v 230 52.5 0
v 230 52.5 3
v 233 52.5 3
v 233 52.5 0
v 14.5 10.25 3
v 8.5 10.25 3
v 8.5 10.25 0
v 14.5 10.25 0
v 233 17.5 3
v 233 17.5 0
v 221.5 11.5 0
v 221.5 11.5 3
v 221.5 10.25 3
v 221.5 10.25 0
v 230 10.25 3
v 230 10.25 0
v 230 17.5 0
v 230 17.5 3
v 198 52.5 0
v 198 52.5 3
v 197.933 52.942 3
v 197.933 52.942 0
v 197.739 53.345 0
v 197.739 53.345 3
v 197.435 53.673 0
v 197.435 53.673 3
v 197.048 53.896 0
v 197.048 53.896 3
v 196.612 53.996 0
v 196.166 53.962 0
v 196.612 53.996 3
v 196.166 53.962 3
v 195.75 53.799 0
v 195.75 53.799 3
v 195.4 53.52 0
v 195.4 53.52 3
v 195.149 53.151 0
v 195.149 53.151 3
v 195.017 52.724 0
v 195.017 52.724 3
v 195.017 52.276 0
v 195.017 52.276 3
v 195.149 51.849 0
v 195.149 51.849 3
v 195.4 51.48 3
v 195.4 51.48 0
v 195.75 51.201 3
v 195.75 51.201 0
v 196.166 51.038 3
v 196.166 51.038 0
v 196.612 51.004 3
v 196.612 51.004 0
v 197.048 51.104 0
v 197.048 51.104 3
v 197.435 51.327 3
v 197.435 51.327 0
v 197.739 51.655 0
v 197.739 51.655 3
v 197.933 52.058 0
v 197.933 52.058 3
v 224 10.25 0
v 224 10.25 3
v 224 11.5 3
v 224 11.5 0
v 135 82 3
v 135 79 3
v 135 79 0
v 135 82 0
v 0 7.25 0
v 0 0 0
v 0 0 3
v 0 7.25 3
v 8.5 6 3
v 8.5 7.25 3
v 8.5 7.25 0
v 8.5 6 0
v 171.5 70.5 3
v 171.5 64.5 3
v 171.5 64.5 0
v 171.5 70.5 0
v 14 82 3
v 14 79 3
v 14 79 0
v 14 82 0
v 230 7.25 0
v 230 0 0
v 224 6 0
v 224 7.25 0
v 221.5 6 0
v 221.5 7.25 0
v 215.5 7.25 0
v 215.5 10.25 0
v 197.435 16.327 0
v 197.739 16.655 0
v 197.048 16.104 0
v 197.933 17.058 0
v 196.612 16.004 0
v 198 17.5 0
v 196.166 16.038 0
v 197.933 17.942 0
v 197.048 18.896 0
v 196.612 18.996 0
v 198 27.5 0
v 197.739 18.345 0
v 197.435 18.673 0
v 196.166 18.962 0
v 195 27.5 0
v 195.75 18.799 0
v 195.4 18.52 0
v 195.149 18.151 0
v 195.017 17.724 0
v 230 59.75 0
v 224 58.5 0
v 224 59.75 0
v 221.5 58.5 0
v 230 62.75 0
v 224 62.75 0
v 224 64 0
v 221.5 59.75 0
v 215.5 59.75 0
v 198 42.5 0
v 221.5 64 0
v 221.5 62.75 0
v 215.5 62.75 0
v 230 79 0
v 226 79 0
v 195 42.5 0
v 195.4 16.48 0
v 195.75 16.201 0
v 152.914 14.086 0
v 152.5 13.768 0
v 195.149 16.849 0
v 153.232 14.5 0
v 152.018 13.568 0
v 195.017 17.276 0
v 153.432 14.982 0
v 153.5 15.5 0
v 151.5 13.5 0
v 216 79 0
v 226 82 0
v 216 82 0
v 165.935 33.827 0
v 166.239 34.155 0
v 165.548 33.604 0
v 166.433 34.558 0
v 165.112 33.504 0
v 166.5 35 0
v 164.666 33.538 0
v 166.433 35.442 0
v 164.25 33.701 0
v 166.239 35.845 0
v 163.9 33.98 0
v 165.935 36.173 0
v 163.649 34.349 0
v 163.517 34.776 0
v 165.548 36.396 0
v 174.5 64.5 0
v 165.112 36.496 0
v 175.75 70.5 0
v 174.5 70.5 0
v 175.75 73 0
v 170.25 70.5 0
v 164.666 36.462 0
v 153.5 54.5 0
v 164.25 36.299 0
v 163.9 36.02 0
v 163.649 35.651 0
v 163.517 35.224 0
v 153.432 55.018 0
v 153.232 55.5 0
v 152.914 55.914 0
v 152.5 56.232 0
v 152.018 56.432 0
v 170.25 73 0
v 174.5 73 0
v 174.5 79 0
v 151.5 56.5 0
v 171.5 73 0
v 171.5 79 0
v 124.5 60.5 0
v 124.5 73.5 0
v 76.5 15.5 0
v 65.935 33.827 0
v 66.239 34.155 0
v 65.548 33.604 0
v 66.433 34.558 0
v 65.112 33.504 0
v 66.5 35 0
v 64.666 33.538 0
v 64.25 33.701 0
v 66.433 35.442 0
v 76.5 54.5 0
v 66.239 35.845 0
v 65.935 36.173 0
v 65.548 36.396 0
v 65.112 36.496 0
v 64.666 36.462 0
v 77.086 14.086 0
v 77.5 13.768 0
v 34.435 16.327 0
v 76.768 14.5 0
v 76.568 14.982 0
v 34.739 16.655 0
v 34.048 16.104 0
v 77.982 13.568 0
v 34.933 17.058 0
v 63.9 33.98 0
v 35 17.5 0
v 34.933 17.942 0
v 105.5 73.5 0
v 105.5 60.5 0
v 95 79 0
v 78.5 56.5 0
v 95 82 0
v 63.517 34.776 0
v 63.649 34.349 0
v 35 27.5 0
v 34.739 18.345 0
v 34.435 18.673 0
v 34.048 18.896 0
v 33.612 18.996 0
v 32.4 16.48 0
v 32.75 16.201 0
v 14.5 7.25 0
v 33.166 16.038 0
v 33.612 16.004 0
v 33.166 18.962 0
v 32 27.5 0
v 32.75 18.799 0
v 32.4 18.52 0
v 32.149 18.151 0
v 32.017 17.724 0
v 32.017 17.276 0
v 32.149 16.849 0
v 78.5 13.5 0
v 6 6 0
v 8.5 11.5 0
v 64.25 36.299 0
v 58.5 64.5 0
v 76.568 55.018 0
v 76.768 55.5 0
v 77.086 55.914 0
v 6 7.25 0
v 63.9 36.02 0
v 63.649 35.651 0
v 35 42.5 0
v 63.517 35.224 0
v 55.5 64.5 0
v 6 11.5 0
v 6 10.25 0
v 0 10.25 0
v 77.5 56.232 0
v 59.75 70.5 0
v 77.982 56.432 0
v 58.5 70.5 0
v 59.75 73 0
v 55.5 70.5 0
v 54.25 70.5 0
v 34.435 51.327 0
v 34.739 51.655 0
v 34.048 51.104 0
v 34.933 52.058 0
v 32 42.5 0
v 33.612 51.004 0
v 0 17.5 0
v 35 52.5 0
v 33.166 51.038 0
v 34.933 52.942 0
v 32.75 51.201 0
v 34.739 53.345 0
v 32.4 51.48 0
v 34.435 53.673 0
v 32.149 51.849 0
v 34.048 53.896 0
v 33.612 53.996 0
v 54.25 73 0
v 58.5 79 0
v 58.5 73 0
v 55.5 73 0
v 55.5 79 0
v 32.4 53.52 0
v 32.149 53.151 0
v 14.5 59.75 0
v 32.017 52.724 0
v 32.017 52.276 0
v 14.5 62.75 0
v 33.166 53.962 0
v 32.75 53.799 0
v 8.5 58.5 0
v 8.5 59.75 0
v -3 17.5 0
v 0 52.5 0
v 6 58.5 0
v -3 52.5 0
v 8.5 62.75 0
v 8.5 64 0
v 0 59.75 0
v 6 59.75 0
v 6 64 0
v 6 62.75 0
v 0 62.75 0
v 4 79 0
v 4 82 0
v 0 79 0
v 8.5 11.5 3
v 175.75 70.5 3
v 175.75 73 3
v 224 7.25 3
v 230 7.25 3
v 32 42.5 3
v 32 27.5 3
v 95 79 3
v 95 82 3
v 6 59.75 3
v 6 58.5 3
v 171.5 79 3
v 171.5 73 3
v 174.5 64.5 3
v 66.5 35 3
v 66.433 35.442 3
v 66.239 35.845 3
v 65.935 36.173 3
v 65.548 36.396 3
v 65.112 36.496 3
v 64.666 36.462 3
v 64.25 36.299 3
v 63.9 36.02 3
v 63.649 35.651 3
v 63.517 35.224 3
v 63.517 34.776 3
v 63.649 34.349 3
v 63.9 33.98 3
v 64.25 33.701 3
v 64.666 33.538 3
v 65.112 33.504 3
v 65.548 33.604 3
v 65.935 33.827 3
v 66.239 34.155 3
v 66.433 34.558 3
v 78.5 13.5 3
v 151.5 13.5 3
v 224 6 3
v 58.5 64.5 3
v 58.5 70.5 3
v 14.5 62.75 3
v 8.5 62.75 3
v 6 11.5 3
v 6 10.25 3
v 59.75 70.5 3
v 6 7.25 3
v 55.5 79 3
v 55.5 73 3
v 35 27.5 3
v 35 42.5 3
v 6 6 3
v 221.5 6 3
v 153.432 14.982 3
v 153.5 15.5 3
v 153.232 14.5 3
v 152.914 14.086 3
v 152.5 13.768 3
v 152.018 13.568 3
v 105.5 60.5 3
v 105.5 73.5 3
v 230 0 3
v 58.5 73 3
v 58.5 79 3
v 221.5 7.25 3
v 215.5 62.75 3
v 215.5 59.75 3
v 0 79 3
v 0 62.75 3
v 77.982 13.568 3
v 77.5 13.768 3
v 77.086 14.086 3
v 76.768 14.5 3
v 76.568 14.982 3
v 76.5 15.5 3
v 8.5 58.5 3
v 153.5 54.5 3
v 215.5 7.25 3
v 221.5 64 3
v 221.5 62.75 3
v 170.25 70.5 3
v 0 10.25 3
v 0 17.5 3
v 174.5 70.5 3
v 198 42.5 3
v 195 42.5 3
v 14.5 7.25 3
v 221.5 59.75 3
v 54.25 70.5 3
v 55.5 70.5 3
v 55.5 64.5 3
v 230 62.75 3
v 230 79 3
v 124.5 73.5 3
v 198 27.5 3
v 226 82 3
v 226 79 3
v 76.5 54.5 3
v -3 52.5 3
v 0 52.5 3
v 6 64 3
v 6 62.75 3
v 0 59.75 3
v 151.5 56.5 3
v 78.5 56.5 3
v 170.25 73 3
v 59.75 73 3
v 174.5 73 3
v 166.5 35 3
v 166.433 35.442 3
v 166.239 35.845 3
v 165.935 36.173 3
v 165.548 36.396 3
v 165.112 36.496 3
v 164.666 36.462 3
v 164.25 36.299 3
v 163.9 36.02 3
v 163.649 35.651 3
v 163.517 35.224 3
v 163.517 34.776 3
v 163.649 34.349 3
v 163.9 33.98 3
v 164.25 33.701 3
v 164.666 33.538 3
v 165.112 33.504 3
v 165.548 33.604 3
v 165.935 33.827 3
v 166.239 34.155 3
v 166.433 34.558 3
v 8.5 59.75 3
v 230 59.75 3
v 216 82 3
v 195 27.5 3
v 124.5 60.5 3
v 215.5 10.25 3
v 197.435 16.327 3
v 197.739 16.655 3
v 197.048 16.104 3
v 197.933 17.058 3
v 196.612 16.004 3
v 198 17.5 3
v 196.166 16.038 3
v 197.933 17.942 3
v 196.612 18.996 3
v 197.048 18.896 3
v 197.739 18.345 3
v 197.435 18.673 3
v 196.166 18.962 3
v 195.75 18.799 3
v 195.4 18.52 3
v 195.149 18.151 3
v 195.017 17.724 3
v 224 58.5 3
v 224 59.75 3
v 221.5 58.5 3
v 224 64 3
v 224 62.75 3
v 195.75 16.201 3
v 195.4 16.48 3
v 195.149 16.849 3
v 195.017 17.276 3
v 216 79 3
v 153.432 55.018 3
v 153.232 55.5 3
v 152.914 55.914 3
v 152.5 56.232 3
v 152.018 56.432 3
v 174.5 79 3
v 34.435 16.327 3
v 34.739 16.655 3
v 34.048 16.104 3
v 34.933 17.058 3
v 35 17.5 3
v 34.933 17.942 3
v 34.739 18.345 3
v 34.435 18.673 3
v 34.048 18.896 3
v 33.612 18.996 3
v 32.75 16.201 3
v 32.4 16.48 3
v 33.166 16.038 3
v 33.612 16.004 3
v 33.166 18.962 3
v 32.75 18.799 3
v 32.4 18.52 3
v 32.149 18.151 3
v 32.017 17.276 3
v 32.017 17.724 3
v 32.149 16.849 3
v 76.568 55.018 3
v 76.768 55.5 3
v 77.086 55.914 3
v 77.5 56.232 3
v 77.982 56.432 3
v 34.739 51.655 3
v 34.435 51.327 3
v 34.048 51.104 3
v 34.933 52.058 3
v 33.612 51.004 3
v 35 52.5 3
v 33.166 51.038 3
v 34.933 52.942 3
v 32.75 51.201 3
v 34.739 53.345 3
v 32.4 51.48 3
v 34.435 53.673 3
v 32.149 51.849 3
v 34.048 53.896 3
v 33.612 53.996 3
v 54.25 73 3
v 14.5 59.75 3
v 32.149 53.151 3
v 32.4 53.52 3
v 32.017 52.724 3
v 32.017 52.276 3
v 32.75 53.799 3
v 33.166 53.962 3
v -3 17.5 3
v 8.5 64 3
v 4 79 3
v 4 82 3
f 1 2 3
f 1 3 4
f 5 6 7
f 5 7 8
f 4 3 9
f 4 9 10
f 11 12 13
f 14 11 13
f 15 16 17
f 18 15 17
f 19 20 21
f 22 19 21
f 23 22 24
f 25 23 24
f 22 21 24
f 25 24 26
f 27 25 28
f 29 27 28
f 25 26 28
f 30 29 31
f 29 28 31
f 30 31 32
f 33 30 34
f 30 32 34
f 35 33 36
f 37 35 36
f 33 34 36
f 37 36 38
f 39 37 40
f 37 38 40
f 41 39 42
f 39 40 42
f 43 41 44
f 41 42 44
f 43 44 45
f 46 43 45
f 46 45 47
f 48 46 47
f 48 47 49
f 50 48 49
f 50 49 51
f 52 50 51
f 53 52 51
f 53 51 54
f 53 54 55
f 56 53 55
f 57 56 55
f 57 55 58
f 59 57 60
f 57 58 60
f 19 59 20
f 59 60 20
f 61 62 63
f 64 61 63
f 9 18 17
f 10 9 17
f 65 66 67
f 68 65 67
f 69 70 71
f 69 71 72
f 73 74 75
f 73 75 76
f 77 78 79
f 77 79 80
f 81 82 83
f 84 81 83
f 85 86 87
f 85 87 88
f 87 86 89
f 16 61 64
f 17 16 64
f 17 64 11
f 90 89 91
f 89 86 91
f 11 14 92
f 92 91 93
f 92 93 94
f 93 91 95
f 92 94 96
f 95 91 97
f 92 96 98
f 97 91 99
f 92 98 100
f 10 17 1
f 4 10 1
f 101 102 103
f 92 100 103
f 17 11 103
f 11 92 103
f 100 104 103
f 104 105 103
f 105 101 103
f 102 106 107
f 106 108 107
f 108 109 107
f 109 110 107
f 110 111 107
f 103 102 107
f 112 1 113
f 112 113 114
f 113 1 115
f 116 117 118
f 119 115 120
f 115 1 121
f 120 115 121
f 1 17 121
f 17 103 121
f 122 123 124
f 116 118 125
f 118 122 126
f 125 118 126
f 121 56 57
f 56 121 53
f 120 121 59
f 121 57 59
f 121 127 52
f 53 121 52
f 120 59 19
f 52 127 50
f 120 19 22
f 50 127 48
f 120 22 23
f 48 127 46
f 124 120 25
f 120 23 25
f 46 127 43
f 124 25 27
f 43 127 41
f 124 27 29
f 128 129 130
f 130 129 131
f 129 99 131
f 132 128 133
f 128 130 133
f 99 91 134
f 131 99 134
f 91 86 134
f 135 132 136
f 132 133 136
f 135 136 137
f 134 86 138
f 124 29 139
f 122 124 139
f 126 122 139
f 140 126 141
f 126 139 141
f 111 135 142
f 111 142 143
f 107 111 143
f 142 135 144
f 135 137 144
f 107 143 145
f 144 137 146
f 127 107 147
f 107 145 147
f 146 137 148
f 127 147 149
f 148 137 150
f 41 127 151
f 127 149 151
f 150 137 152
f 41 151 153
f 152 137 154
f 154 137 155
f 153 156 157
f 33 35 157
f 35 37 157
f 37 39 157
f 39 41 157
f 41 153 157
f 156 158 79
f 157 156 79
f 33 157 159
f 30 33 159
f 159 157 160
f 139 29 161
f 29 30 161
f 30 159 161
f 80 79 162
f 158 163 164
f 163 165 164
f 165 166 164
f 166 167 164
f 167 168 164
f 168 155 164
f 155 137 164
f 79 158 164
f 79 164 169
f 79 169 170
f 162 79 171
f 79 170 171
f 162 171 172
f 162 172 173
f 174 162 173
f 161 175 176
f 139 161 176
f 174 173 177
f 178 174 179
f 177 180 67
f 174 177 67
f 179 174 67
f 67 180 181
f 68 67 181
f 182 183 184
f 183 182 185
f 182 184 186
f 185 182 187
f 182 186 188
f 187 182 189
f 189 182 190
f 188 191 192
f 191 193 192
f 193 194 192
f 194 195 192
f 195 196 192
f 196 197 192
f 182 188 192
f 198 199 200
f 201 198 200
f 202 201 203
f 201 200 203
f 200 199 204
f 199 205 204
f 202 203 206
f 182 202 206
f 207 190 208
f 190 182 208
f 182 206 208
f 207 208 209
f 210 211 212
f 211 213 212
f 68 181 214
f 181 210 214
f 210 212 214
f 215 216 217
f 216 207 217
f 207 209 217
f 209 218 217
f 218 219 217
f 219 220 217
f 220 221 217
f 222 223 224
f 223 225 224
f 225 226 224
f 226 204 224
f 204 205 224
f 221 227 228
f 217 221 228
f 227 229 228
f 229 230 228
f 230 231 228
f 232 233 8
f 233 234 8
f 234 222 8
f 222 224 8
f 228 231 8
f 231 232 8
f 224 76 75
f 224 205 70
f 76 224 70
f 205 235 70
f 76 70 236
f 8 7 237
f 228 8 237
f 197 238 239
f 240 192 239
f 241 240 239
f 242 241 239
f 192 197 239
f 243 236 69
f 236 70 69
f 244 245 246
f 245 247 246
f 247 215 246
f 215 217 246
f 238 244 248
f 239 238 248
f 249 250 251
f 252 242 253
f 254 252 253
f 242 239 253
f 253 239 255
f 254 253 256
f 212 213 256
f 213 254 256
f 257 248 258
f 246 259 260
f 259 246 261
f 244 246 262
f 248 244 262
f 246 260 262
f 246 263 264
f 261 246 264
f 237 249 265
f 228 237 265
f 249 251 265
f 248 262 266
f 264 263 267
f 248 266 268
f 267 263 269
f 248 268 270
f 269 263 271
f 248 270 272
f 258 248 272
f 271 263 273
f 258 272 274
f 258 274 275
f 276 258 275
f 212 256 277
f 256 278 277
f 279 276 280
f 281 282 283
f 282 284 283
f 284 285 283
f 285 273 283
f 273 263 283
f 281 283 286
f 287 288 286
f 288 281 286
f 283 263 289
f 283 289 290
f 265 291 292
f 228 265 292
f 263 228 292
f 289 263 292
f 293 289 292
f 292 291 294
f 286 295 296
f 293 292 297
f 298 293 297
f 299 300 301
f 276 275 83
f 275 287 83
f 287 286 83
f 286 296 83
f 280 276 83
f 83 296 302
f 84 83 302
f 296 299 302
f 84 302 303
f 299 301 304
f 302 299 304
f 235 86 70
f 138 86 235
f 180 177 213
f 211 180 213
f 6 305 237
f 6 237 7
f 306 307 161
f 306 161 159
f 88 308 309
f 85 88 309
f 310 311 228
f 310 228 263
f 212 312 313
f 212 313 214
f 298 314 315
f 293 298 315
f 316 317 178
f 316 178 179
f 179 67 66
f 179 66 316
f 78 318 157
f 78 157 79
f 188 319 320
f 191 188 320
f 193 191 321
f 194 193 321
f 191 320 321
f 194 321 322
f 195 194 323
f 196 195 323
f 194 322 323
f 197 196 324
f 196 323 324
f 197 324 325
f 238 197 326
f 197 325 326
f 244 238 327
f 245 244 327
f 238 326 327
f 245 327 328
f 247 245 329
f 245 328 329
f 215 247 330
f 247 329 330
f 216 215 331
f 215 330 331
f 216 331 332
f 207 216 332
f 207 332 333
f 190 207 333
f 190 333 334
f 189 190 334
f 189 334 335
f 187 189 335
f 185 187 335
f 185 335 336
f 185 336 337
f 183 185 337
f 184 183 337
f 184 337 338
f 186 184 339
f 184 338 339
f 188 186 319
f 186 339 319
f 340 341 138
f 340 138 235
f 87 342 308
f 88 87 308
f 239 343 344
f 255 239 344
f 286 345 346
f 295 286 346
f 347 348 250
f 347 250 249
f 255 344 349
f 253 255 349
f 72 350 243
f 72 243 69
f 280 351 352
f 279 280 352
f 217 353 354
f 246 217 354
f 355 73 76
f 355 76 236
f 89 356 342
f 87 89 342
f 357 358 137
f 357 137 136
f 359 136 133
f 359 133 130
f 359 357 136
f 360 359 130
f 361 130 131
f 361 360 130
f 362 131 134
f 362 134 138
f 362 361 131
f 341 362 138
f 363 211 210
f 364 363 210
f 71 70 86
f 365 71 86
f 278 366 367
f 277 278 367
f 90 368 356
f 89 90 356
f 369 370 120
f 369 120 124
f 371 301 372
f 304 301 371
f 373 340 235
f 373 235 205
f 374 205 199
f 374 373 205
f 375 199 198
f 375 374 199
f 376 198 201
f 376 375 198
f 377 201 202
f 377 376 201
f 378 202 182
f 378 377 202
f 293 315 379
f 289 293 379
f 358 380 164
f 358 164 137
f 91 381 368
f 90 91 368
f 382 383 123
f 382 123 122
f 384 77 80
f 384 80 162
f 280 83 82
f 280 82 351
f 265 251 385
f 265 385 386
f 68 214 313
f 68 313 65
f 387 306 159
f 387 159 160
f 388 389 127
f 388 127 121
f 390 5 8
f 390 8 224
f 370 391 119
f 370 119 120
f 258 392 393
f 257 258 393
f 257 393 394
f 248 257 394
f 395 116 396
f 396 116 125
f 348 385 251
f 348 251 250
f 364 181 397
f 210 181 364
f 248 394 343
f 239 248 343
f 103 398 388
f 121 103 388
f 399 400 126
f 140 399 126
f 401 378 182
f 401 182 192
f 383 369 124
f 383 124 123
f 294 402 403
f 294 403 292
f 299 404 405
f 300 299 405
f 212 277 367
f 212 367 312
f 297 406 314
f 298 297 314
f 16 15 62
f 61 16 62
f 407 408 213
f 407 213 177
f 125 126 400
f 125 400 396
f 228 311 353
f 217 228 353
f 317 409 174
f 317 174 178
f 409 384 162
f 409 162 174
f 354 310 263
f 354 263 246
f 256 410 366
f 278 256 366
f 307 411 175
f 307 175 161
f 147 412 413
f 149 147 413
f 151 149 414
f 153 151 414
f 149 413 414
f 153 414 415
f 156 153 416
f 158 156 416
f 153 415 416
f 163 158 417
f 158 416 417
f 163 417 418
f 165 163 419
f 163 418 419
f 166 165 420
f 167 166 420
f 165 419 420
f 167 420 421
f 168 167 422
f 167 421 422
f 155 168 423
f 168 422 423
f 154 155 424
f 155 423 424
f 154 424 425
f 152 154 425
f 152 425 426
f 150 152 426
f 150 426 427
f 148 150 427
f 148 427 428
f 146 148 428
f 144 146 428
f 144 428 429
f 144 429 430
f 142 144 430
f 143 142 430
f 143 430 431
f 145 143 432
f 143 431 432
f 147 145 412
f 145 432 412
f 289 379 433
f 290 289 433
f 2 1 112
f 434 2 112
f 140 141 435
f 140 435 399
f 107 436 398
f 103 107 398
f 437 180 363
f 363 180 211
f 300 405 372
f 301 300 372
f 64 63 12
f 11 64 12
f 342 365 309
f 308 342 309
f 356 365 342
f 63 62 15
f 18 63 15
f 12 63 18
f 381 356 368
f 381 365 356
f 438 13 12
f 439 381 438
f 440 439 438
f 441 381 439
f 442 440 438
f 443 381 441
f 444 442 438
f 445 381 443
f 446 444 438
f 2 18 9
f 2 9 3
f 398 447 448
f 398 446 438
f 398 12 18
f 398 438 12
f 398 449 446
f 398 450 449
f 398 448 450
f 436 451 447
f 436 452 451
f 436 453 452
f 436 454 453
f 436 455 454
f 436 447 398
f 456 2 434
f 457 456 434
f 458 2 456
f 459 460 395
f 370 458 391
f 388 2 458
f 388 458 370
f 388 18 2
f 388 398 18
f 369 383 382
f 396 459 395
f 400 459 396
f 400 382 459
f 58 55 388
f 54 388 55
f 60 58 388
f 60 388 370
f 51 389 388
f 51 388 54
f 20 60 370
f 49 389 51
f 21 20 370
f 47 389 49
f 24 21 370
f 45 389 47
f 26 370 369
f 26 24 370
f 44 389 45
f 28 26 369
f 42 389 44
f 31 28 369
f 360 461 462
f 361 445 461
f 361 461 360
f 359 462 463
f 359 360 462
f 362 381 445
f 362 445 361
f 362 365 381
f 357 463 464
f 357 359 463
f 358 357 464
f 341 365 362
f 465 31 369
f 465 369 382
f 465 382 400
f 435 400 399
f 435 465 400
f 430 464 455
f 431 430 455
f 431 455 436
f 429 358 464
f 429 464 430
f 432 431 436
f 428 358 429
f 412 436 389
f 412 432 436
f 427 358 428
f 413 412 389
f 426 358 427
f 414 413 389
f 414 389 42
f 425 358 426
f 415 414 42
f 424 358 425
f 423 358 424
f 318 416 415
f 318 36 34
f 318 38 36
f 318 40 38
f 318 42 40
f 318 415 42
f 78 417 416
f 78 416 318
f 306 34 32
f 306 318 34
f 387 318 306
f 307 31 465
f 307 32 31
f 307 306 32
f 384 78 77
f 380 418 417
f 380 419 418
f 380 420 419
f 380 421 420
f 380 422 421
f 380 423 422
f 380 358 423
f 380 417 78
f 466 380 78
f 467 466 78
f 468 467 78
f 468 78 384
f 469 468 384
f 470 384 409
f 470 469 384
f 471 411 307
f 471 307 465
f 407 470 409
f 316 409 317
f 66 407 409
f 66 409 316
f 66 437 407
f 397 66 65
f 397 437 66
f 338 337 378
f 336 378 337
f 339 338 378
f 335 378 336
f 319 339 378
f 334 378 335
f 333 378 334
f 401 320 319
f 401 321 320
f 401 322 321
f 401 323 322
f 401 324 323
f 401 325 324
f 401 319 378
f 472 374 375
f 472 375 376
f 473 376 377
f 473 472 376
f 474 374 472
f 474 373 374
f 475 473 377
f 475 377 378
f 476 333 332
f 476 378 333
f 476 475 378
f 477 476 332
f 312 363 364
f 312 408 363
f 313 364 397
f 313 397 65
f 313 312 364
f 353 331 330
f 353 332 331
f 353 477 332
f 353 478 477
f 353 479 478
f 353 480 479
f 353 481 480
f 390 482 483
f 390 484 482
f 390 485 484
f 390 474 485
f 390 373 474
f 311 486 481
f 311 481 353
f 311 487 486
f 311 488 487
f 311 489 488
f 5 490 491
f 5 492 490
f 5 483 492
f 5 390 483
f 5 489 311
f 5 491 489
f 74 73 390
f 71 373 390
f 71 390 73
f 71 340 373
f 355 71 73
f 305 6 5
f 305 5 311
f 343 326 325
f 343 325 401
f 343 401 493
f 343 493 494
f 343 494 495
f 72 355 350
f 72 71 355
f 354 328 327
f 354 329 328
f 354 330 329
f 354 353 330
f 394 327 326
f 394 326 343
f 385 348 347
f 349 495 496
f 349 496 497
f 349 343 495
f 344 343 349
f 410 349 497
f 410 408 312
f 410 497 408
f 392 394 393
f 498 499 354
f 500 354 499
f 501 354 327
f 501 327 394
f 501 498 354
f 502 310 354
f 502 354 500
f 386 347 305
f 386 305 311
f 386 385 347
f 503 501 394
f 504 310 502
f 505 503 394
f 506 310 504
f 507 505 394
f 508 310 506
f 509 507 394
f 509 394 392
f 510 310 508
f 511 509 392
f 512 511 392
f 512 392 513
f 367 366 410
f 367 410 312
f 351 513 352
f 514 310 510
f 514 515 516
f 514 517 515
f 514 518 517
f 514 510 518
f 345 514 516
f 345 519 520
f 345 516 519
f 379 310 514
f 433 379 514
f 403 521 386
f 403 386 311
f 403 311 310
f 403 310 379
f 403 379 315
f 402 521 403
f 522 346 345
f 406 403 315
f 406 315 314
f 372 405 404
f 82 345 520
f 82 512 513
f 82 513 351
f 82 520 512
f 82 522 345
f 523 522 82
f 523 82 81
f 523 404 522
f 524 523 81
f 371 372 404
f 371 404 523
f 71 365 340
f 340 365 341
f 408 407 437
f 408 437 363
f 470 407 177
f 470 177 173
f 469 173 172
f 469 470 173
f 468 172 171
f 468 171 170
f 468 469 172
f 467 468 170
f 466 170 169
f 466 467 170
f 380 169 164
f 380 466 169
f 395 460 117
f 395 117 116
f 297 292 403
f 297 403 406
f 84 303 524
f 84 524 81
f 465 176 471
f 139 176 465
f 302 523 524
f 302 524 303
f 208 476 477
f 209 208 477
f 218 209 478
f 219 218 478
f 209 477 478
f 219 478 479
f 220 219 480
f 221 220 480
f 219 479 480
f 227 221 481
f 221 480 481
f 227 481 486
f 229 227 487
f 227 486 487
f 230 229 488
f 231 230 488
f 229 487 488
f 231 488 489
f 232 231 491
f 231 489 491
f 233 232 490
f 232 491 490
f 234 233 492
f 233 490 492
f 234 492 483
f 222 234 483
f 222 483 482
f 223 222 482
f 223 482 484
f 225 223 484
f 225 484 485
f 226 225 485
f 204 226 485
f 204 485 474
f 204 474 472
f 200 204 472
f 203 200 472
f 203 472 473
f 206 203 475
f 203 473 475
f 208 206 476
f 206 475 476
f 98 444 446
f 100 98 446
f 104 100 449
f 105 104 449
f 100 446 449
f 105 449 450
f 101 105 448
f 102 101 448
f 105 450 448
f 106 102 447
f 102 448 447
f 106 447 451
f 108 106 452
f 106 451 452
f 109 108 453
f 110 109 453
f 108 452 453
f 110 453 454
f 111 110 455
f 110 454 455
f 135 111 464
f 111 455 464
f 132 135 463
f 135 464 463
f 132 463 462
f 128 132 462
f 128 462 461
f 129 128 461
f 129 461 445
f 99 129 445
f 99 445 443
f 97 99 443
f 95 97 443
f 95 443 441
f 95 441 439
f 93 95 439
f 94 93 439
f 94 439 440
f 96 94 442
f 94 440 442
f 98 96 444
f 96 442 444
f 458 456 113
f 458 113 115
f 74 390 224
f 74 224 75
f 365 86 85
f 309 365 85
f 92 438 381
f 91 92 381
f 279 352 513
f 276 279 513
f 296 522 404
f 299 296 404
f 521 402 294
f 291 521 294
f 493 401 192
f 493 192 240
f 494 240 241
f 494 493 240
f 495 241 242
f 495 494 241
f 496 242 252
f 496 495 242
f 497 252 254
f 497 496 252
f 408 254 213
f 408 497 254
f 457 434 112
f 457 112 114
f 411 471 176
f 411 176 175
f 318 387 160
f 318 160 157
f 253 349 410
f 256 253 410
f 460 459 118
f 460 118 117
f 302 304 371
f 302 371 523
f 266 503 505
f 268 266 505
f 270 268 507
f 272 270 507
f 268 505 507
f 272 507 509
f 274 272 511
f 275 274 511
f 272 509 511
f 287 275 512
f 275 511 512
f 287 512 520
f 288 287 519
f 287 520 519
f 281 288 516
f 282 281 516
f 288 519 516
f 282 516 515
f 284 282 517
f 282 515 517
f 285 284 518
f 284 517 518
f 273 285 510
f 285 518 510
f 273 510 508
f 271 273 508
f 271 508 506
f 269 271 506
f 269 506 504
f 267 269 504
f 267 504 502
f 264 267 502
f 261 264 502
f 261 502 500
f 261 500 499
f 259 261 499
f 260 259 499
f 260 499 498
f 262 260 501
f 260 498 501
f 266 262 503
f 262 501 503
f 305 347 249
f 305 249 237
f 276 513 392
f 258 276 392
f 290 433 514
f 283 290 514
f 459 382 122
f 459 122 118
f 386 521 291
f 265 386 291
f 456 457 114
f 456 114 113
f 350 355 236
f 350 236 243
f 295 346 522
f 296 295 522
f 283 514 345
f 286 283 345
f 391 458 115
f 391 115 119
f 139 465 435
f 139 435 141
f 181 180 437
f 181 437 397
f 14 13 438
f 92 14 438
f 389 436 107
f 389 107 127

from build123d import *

# Parameters (mm, degrees)
SKETCH_1_W           = 230
SKETCH_1_H           = 79
EXTRUDE_1_DEPTH      = 3
EXTRUDE_2_DEPTH      = 3
EXTRUDE_2_DEPTH_BACK = 233
SKETCH_4_W           = 3
SKETCH_4_H           = 35
SKETCH_2_R           = 1.5
CUT_EXTRUDE_1_DEPTH  = 3
SKETCH_3_R           = 1.5
CUT_EXTRUDE_2_DEPTH  = 3
SKETCH_5_W           = 3
SKETCH_5_H           = 15
CUT_EXTRUDE_3_DEPTH  = 3
CUT_EXTRUDE_4_DEPTH  = 3
SKETCH_8_W           = 10
SKETCH_8_H           = 3
EXTRUDE_3_DEPTH      = 3
SKETCH_9_W           = 40
SKETCH_9_H           = 3
EXTRUDE_4_DEPTH      = 3
CUT_EXTRUDE_5_DEPTH  = 3
CUT_EXTRUDE_6_DEPTH  = 3
SKETCH_12_W          = 19
SKETCH_12_H          = 13
CUT_EXTRUDE_7_DEPTH  = 10


with BuildPart() as part:
    # Эскиз1 → Бобышка-Вытянуть1 (new body)
    with BuildSketch(Plane.XY):
        with Locations((115, 39.5)):
            Rectangle(SKETCH_1_W, SKETCH_1_H)
    extrude(amount=EXTRUDE_1_DEPTH)

    # Эскиз4 → Бобышка-Вытянуть2 (add, two sides: drawn at the far end of the back side and taken through both)
    with BuildSketch(Plane(origin=(230, 0, 0), x_dir=(0, 0, -1), z_dir=(1, 0, 0)).offset(-EXTRUDE_2_DEPTH_BACK)):
        with Locations((-1.5, 35)):
            Rectangle(SKETCH_4_W, SKETCH_4_H)
    extrude(amount=EXTRUDE_2_DEPTH + EXTRUDE_2_DEPTH_BACK)

    # Эскиз2 → Вырез-Вытянуть1 (cut)
    with BuildSketch(Plane.XY.offset(3)):
        with Locations((65, 35)):
            Circle(SKETCH_2_R)
        with Locations((165, 35)):
            Circle(SKETCH_2_R)
    extrude(amount=-CUT_EXTRUDE_1_DEPTH, mode=Mode.SUBTRACT)

    # Эскиз3 → Вырез-Вытянуть2 (cut)
    with BuildSketch(Plane.XY.offset(3)):
        with Locations((33.5, 52.5)):
            Circle(SKETCH_3_R)
        with Locations((196.5, 52.5)):
            Circle(SKETCH_3_R)
        with Locations((196.5, 17.5)):
            Circle(SKETCH_3_R)
        with Locations((33.5, 17.5)):
            Circle(SKETCH_3_R)
    extrude(amount=-CUT_EXTRUDE_2_DEPTH, mode=Mode.SUBTRACT)

    # Эскиз5 → Вырез-Вытянуть3 (cut)
    with BuildSketch(Plane.XY.offset(3)):
        with Locations((33.5, 35)):
            Rectangle(SKETCH_5_W, SKETCH_5_H)
        with Locations((196.5, 35)):
            Rectangle(SKETCH_5_W, SKETCH_5_H)
    extrude(amount=-CUT_EXTRUDE_3_DEPTH, mode=Mode.SUBTRACT)

    # Эскиз6 → Вырез-Вытянуть4 (cut)
    with BuildSketch(Plane.XY.offset(3)):
        Polygon((0, 10.25), (6, 10.25), (6, 11.5), (8.5, 11.5), (8.5, 10.25), (14.5, 10.25), (14.5, 7.25), (8.5, 7.25), (8.5, 6), (6, 6), (6, 7.25), (0, 7.25), align=None)
        Polygon((230, 7.25), (230, 10.25), (224, 10.25), (224, 11.5), (221.5, 11.5), (221.5, 10.25), (215.5, 10.25), (215.5, 7.25), (221.5, 7.25), (221.5, 6), (224, 6), (224, 7.25), align=None)
        Polygon((230, 59.75), (224, 59.75), (224, 58.5), (221.5, 58.5), (221.5, 59.75), (215.5, 59.75), (215.5, 62.75), (221.5, 62.75), (221.5, 64), (224, 64), (224, 62.75), (230, 62.75), align=None)
        Polygon((0, 62.75), (0, 59.75), (6, 59.75), (6, 58.5), (8.5, 58.5), (8.5, 59.75), (14.5, 59.75), (14.5, 62.75), (8.5, 62.75), (8.5, 64), (6, 64), (6, 62.75), align=None)
    extrude(amount=-CUT_EXTRUDE_4_DEPTH, mode=Mode.SUBTRACT)

    # Эскиз8 → Бобышка-Вытянуть3 (add)
    with BuildSketch(Plane(origin=(0, 79, 0), x_dir=(1, 0, 0), z_dir=(0, 1, 0))):
        with Locations((221, -1.5)):
            Rectangle(SKETCH_8_W, SKETCH_8_H)
        with Locations((9, -1.5)):
            Rectangle(SKETCH_8_W, SKETCH_8_H)
    extrude(amount=EXTRUDE_3_DEPTH)

    # Эскиз9 → Бобышка-Вытянуть4 (add)
    with BuildSketch(Plane(origin=(0, 79, 0), x_dir=(1, 0, 0), z_dir=(0, 1, 0))):
        with Locations((115, -1.5)):
            Rectangle(SKETCH_9_W, SKETCH_9_H)
    extrude(amount=EXTRUDE_4_DEPTH)

    # Эскиз10 → Вырез-Вытянуть5 (cut)
    with BuildSketch(Plane.XY.offset(3)):
        Polygon((55.5, 79), (55.5, 73), (54.25, 73), (54.25, 70.5), (55.5, 70.5), (55.5, 64.5), (58.5, 64.5), (58.5, 70.5), (59.75, 70.5), (59.75, 73), (58.5, 73), (58.5, 79), align=None)
        Polygon((171.5, 79), (174.5, 79), (174.5, 73), (175.75, 73), (175.75, 70.5), (174.5, 70.5), (174.5, 64.5), (171.5, 64.5), (171.5, 70.5), (170.25, 70.5), (170.25, 73), (171.5, 73), align=None)
    extrude(amount=-CUT_EXTRUDE_5_DEPTH, mode=Mode.SUBTRACT)

    # Эскиз11 → Вырез-Вытянуть6 (cut)
    with BuildSketch(Plane.XY.offset(3)):
        with BuildLine():
            Line((78.5, 56.5), (151.5, 56.5))
            ThreePointArc((151.5, 56.5), (152.914213562, 55.914213562), (153.5, 54.5))
            Line((153.5, 54.5), (153.5, 15.5))
            ThreePointArc((153.5, 15.5), (152.914213562, 14.085786438), (151.5, 13.5))
            Line((151.5, 13.5), (78.5, 13.5))
            ThreePointArc((78.5, 13.5), (77.085786438, 14.085786438), (76.5, 15.5))
            Line((76.5, 15.5), (76.5, 54.5))
            ThreePointArc((76.5, 54.5), (77.085786438, 55.914213562), (78.5, 56.5))
        make_face()
    extrude(amount=-CUT_EXTRUDE_6_DEPTH, mode=Mode.SUBTRACT)

    # Эскиз12 → Вырез-Вытянуть7 (cut)
    with BuildSketch(Plane(origin=(0, 0, 0), x_dir=(-1, 0, 0), z_dir=(0, 0, -1))):
        with Locations((-115, 67)):
            Rectangle(SKETCH_12_W, SKETCH_12_H)
    extrude(amount=-CUT_EXTRUDE_7_DEPTH, mode=Mode.SUBTRACT)


solid = part.part
